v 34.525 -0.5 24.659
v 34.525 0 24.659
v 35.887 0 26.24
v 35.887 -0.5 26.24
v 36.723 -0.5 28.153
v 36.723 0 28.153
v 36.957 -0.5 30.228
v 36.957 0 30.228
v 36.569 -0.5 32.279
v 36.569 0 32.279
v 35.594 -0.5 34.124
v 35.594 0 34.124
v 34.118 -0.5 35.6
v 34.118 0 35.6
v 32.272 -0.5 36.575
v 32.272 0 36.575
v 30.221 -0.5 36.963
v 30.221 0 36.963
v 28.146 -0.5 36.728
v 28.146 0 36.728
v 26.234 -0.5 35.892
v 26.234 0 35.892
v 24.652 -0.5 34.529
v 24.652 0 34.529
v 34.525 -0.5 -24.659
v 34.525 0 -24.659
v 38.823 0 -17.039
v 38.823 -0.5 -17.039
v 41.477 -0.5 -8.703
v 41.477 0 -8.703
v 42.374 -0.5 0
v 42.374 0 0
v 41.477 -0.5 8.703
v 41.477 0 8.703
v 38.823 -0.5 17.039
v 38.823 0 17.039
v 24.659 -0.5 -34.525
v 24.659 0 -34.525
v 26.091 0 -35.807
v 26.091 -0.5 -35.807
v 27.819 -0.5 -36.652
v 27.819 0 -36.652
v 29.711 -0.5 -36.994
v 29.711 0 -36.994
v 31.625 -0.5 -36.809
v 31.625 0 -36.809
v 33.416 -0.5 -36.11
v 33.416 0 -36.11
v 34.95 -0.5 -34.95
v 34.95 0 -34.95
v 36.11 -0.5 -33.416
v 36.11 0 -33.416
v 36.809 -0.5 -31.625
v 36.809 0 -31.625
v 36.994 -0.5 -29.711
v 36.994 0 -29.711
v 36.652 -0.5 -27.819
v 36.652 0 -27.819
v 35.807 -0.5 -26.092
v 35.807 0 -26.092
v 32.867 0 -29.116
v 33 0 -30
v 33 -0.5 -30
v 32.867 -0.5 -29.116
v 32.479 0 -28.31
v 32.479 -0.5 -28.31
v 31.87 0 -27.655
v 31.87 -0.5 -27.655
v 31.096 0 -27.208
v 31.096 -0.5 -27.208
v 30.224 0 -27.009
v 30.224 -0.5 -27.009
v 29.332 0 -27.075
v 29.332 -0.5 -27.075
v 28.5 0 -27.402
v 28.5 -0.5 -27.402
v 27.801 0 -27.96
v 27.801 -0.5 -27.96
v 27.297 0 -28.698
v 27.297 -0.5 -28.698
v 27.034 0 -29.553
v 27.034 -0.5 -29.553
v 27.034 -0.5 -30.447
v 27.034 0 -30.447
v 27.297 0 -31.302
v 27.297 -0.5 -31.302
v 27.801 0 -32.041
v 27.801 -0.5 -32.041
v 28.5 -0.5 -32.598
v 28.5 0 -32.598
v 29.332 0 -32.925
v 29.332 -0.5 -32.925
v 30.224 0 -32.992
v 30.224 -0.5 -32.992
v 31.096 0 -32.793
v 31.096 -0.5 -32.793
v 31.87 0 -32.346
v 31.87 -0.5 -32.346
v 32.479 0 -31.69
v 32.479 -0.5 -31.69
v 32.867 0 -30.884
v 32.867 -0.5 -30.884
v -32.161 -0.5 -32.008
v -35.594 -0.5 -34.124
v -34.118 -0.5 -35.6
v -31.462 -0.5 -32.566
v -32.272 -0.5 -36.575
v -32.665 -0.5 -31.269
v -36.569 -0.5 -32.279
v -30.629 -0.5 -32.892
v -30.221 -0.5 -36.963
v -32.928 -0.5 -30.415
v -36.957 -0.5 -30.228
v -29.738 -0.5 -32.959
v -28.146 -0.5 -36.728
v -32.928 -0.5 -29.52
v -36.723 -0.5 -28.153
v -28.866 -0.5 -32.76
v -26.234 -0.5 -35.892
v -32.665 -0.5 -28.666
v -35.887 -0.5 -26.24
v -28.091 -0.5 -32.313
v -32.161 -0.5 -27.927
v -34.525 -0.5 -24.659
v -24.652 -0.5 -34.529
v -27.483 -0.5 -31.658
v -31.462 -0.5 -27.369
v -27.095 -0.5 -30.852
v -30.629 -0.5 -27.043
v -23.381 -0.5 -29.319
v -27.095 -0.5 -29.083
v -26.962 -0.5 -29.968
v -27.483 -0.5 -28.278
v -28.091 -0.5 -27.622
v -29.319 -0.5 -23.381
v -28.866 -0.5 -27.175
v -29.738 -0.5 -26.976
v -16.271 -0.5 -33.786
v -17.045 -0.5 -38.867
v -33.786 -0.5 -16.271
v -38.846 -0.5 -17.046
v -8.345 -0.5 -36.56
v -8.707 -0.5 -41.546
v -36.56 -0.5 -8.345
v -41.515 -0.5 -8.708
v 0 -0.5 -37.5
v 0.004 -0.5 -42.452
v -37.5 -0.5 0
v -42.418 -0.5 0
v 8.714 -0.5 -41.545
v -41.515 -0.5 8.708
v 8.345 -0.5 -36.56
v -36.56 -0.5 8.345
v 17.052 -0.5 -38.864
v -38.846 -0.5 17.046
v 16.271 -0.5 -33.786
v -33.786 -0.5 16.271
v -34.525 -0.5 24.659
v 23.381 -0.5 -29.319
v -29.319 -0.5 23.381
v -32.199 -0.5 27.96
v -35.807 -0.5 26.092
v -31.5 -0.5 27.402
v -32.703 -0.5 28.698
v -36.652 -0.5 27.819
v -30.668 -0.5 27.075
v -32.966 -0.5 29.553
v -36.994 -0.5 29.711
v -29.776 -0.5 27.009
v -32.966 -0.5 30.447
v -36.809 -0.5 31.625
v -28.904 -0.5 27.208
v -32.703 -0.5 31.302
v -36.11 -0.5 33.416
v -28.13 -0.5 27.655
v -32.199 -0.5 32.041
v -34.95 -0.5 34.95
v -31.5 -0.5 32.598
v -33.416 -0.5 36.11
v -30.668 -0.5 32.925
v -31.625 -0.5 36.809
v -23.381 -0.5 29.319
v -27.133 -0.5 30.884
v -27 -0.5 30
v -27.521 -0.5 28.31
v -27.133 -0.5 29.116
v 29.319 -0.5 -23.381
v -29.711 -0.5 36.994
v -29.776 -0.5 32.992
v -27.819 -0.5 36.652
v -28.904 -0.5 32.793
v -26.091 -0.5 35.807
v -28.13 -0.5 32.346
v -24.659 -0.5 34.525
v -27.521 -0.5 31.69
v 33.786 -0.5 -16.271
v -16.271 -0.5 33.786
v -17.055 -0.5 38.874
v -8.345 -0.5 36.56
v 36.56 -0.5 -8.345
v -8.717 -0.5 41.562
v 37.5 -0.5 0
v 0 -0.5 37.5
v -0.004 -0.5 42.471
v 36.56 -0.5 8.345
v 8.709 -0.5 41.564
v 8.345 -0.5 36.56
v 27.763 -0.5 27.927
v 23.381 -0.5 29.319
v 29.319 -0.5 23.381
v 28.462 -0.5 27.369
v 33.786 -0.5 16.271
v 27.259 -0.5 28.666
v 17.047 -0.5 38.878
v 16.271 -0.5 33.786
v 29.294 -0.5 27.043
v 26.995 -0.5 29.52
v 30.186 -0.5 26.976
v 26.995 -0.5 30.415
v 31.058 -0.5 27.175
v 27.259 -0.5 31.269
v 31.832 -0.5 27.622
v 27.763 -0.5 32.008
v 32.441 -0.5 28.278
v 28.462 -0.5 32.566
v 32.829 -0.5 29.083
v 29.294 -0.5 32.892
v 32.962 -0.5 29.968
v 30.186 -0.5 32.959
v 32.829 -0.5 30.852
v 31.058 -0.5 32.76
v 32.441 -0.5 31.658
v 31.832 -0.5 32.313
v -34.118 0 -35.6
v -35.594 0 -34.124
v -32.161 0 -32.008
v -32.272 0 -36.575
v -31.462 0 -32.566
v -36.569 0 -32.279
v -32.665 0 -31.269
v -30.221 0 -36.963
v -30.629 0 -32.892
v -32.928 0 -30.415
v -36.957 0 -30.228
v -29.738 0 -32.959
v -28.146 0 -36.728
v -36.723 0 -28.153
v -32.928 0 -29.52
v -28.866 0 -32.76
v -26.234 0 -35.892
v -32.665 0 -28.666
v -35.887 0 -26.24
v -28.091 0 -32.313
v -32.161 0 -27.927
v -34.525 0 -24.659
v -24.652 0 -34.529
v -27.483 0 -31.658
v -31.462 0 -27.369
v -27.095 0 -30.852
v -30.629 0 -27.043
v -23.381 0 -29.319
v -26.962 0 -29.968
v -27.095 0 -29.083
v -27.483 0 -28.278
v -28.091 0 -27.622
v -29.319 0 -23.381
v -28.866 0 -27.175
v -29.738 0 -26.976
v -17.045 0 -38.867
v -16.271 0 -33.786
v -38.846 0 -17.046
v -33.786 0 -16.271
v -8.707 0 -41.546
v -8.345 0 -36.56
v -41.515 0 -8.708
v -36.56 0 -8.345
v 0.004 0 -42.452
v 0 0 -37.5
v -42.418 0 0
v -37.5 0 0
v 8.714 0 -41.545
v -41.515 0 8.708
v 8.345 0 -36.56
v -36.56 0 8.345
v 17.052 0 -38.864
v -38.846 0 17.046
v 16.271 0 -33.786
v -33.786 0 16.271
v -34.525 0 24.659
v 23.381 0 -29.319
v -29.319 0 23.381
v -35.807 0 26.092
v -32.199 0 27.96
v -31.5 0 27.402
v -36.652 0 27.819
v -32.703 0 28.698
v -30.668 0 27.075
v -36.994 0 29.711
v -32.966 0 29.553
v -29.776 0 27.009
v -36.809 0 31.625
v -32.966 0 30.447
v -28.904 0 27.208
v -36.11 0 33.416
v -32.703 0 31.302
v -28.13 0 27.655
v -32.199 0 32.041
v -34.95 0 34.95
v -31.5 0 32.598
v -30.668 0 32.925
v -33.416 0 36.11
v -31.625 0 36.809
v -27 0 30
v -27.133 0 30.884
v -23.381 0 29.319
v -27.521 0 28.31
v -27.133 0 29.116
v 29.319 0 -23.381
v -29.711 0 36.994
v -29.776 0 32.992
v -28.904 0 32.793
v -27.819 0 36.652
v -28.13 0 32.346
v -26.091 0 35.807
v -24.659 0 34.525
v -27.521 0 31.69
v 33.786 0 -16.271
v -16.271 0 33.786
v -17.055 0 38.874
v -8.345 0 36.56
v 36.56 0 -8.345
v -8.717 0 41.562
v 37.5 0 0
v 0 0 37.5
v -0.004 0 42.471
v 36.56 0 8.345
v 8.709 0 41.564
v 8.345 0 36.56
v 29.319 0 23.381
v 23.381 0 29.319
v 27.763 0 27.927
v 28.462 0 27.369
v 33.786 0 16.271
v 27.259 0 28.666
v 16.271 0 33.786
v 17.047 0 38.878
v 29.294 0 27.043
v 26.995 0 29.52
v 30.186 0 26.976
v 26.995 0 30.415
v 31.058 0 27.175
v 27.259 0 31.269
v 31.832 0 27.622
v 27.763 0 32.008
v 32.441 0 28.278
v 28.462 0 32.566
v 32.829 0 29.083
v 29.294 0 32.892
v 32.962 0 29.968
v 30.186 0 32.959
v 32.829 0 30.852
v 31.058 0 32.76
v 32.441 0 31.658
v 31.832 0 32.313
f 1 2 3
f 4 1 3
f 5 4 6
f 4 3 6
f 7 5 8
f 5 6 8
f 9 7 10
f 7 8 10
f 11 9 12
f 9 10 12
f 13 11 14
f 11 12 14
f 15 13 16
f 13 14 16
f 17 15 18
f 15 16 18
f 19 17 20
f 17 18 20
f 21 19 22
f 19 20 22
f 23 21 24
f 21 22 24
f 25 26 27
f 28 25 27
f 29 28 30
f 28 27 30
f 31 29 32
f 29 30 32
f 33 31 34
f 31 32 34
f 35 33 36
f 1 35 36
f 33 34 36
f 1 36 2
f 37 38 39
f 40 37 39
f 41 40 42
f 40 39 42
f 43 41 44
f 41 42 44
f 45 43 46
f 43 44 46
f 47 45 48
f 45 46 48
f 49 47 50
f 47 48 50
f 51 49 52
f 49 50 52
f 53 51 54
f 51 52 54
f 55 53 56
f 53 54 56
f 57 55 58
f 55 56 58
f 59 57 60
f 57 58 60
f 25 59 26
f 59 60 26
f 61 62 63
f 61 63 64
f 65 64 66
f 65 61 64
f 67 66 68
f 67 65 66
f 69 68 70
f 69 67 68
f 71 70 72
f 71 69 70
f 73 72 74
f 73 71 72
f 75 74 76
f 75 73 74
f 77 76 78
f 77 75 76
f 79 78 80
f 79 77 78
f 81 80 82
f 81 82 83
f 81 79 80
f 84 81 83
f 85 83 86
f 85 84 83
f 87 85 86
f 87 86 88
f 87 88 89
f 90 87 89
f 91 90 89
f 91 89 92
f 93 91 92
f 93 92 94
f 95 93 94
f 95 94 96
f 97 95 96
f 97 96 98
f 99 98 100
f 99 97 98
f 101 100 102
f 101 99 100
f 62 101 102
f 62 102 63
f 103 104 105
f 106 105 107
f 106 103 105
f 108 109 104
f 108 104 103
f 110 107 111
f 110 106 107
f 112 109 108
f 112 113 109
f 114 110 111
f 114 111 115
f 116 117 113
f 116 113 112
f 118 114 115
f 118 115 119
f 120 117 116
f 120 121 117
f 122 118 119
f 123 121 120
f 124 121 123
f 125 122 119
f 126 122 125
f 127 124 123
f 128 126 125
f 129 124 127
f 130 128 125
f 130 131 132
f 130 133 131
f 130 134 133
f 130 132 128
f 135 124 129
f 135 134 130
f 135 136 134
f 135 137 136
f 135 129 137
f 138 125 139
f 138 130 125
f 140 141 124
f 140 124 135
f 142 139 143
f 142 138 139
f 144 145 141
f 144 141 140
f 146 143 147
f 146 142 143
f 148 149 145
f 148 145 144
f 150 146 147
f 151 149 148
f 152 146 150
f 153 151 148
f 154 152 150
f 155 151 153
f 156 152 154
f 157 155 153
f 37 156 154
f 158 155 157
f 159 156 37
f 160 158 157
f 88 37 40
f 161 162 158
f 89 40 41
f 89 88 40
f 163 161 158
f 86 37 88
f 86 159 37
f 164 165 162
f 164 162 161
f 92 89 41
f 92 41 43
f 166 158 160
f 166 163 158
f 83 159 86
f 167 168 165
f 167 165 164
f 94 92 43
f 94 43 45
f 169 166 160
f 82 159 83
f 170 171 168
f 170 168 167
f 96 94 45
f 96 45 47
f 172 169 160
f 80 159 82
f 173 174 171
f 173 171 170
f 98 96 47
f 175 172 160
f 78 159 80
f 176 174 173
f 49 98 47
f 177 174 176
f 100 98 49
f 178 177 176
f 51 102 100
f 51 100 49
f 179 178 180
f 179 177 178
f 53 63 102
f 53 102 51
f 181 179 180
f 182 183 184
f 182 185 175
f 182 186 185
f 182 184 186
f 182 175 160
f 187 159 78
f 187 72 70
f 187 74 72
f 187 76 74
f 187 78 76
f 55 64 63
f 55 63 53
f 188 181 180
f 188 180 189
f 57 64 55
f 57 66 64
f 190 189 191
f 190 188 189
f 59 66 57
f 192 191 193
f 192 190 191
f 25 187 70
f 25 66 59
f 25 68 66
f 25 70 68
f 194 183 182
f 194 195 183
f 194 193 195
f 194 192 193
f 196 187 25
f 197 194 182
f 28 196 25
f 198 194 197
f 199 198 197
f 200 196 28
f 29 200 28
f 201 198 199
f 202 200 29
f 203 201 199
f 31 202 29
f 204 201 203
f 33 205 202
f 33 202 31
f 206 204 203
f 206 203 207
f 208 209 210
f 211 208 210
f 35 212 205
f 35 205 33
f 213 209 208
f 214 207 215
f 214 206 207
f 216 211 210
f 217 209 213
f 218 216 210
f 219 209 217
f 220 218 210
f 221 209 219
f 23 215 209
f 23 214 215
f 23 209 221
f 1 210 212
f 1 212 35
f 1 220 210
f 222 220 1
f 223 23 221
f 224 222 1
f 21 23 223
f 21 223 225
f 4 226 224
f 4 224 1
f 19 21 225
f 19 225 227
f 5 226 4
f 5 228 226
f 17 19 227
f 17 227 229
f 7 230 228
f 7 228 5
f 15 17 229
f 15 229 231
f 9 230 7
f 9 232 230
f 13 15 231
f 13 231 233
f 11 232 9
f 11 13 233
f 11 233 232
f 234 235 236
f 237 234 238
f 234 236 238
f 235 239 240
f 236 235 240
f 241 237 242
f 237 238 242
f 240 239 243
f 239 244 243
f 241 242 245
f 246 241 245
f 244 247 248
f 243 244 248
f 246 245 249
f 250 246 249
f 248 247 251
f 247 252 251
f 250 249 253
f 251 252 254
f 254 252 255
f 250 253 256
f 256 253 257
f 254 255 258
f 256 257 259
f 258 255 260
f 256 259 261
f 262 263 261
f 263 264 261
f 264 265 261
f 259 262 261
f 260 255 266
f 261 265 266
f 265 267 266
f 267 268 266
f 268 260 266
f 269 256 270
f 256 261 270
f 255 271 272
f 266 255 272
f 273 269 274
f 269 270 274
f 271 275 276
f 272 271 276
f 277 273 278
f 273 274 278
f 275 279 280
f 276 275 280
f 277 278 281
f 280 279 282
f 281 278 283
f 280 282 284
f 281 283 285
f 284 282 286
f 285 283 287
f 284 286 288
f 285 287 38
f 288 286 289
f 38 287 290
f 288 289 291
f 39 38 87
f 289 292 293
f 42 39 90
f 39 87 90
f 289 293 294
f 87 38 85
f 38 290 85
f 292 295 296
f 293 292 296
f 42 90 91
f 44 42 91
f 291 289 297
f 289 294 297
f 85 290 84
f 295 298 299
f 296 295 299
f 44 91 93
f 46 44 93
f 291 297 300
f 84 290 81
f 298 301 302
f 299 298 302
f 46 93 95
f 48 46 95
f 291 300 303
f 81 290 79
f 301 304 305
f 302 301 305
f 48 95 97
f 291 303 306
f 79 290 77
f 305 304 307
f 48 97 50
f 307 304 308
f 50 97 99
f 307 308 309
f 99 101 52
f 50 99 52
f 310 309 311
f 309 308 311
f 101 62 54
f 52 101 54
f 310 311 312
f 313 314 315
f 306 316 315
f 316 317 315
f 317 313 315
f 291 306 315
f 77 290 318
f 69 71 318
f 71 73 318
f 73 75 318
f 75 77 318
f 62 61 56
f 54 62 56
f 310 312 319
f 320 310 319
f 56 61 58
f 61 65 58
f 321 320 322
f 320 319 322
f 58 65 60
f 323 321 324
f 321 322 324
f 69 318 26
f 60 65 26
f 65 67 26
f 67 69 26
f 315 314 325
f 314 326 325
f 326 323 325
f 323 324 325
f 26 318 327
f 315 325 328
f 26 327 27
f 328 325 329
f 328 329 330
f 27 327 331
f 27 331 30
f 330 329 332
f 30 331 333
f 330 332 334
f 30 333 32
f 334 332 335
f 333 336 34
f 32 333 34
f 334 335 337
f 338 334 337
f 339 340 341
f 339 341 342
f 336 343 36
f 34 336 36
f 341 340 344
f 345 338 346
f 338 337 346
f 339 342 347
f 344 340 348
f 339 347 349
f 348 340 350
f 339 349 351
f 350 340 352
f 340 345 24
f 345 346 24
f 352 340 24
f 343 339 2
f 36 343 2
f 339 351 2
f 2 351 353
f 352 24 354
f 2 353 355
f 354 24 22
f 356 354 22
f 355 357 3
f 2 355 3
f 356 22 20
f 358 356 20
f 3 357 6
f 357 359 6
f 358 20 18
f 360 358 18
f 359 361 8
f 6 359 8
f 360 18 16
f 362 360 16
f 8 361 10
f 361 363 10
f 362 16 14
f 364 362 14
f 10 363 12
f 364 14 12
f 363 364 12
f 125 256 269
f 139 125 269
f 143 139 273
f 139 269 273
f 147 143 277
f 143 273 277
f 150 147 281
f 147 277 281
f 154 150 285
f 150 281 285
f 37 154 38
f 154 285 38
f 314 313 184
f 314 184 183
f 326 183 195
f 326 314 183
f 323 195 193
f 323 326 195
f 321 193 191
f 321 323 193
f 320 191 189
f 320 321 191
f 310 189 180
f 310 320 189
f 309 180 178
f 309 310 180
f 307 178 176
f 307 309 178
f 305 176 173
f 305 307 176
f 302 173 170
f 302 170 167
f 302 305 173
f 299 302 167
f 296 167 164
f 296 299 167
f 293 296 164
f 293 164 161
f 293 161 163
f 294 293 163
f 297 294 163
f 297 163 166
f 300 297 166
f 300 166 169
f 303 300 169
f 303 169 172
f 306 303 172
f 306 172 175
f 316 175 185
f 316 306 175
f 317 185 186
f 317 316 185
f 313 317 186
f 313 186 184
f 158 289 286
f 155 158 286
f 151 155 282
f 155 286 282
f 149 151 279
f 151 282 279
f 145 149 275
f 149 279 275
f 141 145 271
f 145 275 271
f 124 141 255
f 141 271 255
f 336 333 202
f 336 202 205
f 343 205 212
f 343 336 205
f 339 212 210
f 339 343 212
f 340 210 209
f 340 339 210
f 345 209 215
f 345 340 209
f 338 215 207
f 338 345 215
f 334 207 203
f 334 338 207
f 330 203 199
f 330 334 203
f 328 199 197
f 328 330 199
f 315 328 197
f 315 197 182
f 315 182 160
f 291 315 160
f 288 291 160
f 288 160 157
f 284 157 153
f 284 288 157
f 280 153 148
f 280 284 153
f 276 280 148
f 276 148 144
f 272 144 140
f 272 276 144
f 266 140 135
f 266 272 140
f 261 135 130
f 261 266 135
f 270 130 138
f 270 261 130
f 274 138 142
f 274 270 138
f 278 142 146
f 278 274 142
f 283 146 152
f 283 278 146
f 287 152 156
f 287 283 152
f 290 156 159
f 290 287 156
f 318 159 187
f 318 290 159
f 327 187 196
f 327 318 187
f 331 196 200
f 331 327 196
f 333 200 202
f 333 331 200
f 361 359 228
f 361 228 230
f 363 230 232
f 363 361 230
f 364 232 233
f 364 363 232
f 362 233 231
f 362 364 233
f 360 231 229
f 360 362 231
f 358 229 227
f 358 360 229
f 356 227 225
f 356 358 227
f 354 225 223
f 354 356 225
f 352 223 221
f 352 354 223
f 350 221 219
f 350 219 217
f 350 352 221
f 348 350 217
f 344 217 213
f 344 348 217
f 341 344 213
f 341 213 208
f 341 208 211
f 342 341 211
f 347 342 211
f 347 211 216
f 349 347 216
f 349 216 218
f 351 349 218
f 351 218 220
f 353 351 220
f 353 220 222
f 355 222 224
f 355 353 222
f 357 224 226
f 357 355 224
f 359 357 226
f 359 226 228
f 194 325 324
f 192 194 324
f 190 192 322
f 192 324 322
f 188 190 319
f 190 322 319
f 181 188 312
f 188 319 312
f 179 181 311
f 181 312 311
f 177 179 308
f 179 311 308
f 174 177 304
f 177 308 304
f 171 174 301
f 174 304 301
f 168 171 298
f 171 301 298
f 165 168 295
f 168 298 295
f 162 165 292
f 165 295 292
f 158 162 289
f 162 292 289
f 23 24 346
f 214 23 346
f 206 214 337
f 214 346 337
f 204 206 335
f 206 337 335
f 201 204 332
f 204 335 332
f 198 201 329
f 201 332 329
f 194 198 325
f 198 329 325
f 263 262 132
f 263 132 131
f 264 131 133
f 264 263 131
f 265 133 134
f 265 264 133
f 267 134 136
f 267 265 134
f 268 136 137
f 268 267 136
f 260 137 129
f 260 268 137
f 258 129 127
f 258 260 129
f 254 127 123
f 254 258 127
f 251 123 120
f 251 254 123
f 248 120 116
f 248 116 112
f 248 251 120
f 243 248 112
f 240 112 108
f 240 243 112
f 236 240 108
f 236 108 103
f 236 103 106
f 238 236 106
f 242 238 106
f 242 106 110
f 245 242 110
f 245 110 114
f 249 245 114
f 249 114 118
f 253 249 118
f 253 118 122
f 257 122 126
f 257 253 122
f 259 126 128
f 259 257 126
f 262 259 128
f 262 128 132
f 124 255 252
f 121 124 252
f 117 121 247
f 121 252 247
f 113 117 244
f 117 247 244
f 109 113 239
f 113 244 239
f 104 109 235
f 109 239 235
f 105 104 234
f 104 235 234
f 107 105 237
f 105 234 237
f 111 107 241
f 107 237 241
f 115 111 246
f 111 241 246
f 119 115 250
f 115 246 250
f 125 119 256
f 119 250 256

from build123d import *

# Parameters (mm, degrees)
F0_R     = 3
F0_R_2   = 37.5
F1_DEPTH = 0.5


with BuildPart() as f1:
    # F0 (on Front) → F1 (new body)
    with BuildSketch(Plane.XZ):
        with BuildLine():
            ThreePointArc((24.65233, 34.529271), (-0.003968, 42.471267), (-24.658782, 34.524663))
            ThreePointArc((-24.658782, 34.524663), (-34.949737, 34.94989), (-34.524555, 24.658933))
            ThreePointArc((-34.524555, 24.658933), (-42.417707, 0), (-34.524555, -24.658933))
            ThreePointArc((-34.524555, -24.658933), (-34.911112, -34.91779), (-24.65233, -34.529271))
            ThreePointArc((-24.65233, -34.529271), (0.003966, -42.451585), (24.658782, -34.524663))
            ThreePointArc((24.658782, -34.524663), (34.949737, -34.94989), (34.524555, -24.658933))
            ThreePointArc((34.524555, -24.658933), (42.374192, 0), (34.524555, 24.658933))
            ThreePointArc((34.524555, 24.658933), (34.911112, 34.91779), (24.65233, 34.529271))
        make_face()
        with Locations((-29.961838, -29.967569)):
            Circle(F0_R, mode=Mode.SUBTRACT)
        with Locations((30, -30.000132)):
            Circle(F0_R, mode=Mode.SUBTRACT)
        Circle(F0_R_2, mode=Mode.SUBTRACT)
        with Locations((-30, 30.000132)):
            Circle(F0_R, mode=Mode.SUBTRACT)
        with Locations((29.961838, 29.967569)):
            Circle(F0_R, mode=Mode.SUBTRACT)
    extrude(amount=F1_DEPTH)


solid = f1.part
